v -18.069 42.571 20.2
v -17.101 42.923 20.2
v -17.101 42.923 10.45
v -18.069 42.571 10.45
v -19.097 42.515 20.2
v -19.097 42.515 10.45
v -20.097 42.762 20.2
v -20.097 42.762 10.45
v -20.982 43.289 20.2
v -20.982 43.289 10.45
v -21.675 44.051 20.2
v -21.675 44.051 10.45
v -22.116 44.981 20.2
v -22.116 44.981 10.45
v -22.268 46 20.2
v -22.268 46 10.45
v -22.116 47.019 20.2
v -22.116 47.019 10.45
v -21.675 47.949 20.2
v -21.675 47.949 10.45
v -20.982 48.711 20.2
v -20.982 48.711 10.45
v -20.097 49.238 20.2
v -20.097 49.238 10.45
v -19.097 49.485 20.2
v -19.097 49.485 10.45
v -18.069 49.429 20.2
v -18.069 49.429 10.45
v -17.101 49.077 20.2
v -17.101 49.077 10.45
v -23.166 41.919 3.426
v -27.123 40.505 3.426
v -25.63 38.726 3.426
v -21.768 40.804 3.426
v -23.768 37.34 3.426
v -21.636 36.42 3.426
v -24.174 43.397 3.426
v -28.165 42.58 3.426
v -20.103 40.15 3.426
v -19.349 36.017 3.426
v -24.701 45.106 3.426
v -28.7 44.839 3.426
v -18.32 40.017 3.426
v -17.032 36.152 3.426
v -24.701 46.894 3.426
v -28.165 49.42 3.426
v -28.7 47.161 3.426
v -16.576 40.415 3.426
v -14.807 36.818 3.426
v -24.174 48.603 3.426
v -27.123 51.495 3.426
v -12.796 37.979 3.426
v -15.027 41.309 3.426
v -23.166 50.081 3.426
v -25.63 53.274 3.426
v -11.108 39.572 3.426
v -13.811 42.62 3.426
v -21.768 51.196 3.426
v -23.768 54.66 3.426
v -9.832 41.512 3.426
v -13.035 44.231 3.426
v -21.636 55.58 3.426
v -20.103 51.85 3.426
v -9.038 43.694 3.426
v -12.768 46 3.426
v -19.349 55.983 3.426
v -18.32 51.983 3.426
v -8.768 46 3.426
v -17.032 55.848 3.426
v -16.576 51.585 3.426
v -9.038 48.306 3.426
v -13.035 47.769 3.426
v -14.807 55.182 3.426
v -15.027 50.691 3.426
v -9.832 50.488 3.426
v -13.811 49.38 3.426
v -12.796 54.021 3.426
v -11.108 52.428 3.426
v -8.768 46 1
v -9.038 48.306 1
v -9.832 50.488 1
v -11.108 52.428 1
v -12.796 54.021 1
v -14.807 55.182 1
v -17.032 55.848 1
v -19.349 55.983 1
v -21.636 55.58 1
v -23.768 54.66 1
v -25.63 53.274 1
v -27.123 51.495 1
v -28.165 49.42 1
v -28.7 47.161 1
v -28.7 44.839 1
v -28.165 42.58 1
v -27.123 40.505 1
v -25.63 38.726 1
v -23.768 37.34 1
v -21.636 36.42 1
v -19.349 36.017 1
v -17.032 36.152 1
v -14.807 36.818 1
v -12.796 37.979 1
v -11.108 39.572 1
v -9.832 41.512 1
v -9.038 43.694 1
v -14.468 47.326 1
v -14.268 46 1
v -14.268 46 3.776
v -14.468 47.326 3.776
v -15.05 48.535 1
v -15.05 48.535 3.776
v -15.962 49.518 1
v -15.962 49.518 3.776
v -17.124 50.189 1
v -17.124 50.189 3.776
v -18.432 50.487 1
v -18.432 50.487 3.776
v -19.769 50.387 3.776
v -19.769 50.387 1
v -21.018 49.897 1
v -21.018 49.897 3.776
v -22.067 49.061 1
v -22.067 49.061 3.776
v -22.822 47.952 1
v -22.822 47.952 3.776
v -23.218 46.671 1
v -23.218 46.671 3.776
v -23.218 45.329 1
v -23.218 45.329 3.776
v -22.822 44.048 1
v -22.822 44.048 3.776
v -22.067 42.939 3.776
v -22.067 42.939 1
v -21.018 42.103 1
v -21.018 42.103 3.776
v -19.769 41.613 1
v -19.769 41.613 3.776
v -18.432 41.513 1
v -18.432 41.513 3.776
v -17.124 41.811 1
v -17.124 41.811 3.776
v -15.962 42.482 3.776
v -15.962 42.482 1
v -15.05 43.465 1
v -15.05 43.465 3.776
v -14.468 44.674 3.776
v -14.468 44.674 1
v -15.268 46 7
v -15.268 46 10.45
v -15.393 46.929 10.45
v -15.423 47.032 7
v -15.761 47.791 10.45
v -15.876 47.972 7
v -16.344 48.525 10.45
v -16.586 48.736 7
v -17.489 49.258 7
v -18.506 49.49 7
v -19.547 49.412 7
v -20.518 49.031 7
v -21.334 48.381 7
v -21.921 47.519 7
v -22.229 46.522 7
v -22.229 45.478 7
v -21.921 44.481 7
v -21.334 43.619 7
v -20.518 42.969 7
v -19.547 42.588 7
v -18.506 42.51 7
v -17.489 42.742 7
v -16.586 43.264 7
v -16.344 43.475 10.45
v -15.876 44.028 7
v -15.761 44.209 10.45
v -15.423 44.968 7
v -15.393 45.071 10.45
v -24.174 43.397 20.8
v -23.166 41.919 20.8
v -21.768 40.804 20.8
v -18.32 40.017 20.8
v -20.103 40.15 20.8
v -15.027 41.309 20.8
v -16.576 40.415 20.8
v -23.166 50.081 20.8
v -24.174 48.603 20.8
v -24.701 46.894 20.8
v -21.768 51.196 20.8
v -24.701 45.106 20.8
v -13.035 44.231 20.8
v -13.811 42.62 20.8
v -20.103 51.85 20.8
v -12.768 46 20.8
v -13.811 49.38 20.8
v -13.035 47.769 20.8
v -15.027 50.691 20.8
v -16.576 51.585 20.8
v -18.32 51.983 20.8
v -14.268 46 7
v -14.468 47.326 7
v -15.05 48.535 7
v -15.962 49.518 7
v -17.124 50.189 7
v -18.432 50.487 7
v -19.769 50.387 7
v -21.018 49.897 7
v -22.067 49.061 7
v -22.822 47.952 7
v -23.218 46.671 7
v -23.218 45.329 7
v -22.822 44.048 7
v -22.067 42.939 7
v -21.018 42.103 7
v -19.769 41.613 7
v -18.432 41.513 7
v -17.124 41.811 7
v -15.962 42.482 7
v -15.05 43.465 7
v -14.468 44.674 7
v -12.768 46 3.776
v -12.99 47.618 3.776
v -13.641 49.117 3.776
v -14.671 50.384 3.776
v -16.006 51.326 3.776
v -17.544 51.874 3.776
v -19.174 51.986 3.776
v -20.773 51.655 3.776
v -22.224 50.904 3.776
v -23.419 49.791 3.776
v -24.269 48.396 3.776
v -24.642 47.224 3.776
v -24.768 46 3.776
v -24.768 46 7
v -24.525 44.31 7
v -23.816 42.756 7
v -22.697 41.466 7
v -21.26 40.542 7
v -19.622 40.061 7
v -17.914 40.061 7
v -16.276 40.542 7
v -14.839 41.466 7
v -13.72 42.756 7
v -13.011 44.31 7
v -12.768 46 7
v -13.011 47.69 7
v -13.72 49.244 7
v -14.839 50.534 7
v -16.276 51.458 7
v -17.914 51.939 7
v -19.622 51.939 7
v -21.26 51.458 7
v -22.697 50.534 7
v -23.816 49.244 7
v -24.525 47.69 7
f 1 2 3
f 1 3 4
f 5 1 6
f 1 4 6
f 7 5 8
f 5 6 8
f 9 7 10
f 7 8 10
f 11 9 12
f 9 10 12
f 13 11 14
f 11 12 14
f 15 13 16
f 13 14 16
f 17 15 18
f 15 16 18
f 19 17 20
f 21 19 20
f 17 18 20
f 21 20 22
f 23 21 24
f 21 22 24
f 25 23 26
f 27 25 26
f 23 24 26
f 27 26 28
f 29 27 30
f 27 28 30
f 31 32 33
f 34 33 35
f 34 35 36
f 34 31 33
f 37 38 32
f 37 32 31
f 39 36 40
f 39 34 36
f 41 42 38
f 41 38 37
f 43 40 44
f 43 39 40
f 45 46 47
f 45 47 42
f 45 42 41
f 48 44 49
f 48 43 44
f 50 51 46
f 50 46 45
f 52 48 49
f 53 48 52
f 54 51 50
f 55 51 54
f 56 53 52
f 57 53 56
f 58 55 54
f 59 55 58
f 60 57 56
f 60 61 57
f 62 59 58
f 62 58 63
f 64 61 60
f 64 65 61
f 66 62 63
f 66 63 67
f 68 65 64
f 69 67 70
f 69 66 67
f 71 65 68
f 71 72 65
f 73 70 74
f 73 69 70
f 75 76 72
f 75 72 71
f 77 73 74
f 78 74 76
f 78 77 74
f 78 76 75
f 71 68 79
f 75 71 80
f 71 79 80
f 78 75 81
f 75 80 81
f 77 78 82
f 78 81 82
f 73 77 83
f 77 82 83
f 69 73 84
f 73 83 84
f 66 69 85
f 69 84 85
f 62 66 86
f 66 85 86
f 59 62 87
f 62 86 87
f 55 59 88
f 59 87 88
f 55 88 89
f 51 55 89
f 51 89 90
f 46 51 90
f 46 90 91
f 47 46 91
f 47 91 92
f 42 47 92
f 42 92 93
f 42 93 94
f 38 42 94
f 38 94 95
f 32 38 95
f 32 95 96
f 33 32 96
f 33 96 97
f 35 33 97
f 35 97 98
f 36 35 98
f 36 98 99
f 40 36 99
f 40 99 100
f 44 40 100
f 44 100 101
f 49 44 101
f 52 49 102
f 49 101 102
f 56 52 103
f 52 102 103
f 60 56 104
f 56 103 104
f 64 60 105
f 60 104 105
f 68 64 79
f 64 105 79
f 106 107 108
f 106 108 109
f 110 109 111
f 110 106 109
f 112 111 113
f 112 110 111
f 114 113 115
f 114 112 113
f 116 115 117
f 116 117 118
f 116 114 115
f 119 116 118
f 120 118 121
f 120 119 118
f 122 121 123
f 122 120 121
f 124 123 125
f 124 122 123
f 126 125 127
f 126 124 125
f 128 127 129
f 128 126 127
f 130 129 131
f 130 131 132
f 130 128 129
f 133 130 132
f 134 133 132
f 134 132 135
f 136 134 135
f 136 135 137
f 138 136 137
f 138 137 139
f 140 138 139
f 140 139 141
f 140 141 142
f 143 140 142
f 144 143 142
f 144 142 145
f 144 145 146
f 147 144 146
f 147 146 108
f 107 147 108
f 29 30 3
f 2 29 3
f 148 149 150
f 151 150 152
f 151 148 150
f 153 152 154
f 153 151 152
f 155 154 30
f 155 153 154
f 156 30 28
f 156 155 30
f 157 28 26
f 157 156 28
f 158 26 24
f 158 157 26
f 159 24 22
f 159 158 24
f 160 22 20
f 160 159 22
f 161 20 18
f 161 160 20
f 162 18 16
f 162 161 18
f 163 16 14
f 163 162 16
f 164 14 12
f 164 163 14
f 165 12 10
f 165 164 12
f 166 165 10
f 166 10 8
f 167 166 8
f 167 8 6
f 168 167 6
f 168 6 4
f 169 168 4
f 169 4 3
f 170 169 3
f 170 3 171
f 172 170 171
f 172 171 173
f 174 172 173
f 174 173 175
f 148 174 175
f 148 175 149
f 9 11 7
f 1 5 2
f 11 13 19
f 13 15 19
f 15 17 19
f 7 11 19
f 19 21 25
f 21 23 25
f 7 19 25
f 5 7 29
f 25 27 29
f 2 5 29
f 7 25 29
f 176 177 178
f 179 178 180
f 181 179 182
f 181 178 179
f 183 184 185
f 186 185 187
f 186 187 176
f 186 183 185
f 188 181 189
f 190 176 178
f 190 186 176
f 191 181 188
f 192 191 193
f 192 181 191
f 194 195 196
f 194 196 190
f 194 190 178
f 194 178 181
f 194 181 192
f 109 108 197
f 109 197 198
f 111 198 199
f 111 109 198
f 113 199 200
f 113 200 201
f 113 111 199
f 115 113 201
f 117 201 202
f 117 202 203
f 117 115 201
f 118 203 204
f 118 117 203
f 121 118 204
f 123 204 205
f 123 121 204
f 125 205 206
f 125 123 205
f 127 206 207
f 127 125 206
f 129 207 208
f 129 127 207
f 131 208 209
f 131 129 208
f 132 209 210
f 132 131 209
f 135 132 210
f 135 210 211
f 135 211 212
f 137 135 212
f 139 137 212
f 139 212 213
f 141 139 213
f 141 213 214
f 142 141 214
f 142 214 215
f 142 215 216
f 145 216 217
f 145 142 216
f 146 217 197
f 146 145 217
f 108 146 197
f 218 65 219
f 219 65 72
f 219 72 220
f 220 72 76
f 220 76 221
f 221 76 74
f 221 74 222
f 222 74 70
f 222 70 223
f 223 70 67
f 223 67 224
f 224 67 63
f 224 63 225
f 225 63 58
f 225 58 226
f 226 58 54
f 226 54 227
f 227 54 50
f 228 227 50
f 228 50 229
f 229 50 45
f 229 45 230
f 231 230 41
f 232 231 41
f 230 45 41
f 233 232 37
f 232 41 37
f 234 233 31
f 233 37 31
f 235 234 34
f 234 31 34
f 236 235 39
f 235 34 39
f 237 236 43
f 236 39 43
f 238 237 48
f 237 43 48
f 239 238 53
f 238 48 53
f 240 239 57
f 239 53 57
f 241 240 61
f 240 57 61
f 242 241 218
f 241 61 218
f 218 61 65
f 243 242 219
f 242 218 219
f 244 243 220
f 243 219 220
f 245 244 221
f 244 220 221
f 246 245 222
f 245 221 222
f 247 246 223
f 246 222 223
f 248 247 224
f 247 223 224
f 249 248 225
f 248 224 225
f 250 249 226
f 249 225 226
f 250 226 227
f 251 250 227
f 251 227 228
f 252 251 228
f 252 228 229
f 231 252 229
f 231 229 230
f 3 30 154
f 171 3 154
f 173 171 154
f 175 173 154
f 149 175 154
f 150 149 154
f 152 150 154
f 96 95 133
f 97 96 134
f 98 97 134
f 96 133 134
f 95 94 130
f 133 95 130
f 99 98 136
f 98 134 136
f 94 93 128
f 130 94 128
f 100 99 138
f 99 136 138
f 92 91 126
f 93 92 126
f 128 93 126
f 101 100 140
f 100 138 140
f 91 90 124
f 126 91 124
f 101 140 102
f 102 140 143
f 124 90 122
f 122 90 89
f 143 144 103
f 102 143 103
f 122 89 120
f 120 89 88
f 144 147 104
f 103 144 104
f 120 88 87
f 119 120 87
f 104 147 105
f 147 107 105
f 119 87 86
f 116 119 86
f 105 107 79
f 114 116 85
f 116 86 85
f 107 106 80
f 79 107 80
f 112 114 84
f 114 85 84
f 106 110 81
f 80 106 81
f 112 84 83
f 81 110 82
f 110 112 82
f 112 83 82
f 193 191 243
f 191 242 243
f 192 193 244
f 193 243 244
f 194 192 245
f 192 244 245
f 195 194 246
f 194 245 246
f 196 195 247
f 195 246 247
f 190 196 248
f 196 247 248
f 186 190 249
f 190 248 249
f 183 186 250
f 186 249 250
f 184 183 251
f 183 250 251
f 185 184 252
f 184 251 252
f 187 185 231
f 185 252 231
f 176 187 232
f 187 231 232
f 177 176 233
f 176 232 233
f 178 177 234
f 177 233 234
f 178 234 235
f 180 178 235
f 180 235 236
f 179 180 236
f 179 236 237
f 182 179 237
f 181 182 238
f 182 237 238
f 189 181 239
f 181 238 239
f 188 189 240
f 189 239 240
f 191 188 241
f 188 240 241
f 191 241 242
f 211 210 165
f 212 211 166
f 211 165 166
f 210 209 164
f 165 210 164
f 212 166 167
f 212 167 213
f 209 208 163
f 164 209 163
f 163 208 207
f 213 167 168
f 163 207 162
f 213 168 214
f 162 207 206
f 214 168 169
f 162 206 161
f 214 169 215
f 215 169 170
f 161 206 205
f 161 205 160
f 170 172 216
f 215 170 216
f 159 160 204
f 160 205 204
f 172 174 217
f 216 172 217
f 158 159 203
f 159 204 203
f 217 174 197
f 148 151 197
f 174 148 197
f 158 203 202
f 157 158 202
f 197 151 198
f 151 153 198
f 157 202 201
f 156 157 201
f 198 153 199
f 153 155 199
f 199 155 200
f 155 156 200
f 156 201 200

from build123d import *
from OCP.BRepAlgoAPI import BRepAlgoAPI_Cut
from OCP.TopTools import TopTools_ListOfShape

# Parameters (mm, degrees)
SKETCH1_R           = 10
SKETCH1_R_2         = 4.5
BOSS_EXTRUDE1_DEPTH = 2.776375223
SKETCH2_R           = 6
SKETCH2_R_2         = 4.5
BOSS_EXTRUDE3_DEPTH = 3.223625257
SKETCH3_R           = 6
SKETCH3_R_2         = 3.5
BOSS_EXTRUDE4_DEPTH = 3.45
SKETCH4_R           = 6
BOSS_EXTRUDE5_DEPTH = 9.75
SKETCH5_R           = 6
BOSS_EXTRUDE6_DEPTH = 0.6
CUT_EXTRUDE1_START  = -0.35
SKETCH6_R           = 10
SKETCH6_R_2         = 6
CUT_EXTRUDE1_DEPTH  = 0.35


with BuildPart() as part:
    # Sketch1 → Boss-Extrude1 (new body)
    with BuildSketch(Plane.XY.offset(1)):
        with Locations((-18.768000381, 45.999999683)):
            Circle(SKETCH1_R)
        with Locations((-18.768000381, 45.999999683)):
            Circle(SKETCH1_R_2, mode=Mode.SUBTRACT)
    extrude(amount=BOSS_EXTRUDE1_DEPTH)

    # Sketch2 → Boss-Extrude3 (add)
    with BuildSketch(Plane(origin=(-3.3e-07, 0, 3.77637599), x_dir=(0.9999999999999963, 0, 8.742277657347971e-08), z_dir=(-8.742277657347971e-08, -3.821370931908002e-15, 0.9999999999999963))):
        with Locations(Location((-18.76800005, 45.999999683, 0), (0, 0, 180))):
            Circle(SKETCH2_R)
        with Locations((-18.76800005, 45.999999683)):
            Circle(SKETCH2_R_2, mode=Mode.SUBTRACT)
    extrude(amount=BOSS_EXTRUDE3_DEPTH)


with BuildPart() as boss_extrude4_tool:
    # Sketch3 → Boss-Extrude4 (new body)
    with BuildSketch(Plane.XY.offset(7)):
        with Locations((-18.768000662, 45.999999683)):
            Circle(SKETCH3_R)
        with Locations((-18.768000381, 45.999999683)):
            Circle(SKETCH3_R_2, mode=Mode.SUBTRACT)
    extrude(amount=BOSS_EXTRUDE4_DEPTH)


with BuildPart() as part_1:
    add(part.part)


with BuildPart() as part_2:
    # Boss-Extrude4: joined with boss_extrude4_tool
    add(part_1.part.fuse(boss_extrude4_tool.part, tol=0.00001))

    # Sketch4 → Boss-Extrude5 (add)
    with BuildSketch(Plane.XY.offset(10.45)):
        with Locations((-18.768000662, 45.999999683)):
            Circle(SKETCH4_R)
        with BuildLine():
            Line((-17.100629081, 49.07731555), (-17.100628812, 42.922683961))
            ThreePointArc((-17.100628812, 42.922683961), (-22.268000381, 45.99999953), (-17.100629081, 49.07731555))
        make_face(mode=Mode.SUBTRACT)
    extrude(amount=BOSS_EXTRUDE5_DEPTH)

    # Sketch5 → Boss-Extrude6 (add)
    with BuildSketch(Plane.XY.offset(20.2)):
        with Locations((-18.768000662, 45.999999683)):
            Circle(SKETCH5_R)
    extrude(amount=BOSS_EXTRUDE6_DEPTH)


with BuildPart() as cut_extrude1_tool:
    # Sketch6 → Cut-Extrude1 (new body)
    with BuildSketch(Plane(origin=(-3.3e-07, 0, 3.77637599), x_dir=(0.9999999999999963, 0, 8.742277657347971e-08), z_dir=(-8.742277657347971e-08, -3.821370931908002e-15, 0.9999999999999963)).offset(CUT_EXTRUDE1_START)):
        with Locations((-18.76800005, 45.999999683)):
            Circle(SKETCH6_R)
        with Locations((-18.76800005, 45.999999683)):
            Circle(SKETCH6_R_2, mode=Mode.SUBTRACT)
    extrude(amount=CUT_EXTRUDE1_DEPTH)


with BuildPart() as part_3:
    add(part_2.part)

    # Cut-Extrude1: cut by cut_extrude1_tool, with a tolerance
    cut_extrude1_stock = TopTools_ListOfShape()
    cut_extrude1_stock.Append(part_3.part.wrapped)
    cut_extrude1_tools = TopTools_ListOfShape()
    cut_extrude1_tools.Append(cut_extrude1_tool.part.wrapped)
    cut_extrude1_cut = BRepAlgoAPI_Cut()
    cut_extrude1_cut.SetArguments(cut_extrude1_stock)
    cut_extrude1_cut.SetTools(cut_extrude1_tools)
    cut_extrude1_cut.SetFuzzyValue(0.00001)
    cut_extrude1_cut.Build()
    add(Compound.cast(cut_extrude1_cut.Shape()).solids(), mode=Mode.REPLACE)


solid = part_3.part
